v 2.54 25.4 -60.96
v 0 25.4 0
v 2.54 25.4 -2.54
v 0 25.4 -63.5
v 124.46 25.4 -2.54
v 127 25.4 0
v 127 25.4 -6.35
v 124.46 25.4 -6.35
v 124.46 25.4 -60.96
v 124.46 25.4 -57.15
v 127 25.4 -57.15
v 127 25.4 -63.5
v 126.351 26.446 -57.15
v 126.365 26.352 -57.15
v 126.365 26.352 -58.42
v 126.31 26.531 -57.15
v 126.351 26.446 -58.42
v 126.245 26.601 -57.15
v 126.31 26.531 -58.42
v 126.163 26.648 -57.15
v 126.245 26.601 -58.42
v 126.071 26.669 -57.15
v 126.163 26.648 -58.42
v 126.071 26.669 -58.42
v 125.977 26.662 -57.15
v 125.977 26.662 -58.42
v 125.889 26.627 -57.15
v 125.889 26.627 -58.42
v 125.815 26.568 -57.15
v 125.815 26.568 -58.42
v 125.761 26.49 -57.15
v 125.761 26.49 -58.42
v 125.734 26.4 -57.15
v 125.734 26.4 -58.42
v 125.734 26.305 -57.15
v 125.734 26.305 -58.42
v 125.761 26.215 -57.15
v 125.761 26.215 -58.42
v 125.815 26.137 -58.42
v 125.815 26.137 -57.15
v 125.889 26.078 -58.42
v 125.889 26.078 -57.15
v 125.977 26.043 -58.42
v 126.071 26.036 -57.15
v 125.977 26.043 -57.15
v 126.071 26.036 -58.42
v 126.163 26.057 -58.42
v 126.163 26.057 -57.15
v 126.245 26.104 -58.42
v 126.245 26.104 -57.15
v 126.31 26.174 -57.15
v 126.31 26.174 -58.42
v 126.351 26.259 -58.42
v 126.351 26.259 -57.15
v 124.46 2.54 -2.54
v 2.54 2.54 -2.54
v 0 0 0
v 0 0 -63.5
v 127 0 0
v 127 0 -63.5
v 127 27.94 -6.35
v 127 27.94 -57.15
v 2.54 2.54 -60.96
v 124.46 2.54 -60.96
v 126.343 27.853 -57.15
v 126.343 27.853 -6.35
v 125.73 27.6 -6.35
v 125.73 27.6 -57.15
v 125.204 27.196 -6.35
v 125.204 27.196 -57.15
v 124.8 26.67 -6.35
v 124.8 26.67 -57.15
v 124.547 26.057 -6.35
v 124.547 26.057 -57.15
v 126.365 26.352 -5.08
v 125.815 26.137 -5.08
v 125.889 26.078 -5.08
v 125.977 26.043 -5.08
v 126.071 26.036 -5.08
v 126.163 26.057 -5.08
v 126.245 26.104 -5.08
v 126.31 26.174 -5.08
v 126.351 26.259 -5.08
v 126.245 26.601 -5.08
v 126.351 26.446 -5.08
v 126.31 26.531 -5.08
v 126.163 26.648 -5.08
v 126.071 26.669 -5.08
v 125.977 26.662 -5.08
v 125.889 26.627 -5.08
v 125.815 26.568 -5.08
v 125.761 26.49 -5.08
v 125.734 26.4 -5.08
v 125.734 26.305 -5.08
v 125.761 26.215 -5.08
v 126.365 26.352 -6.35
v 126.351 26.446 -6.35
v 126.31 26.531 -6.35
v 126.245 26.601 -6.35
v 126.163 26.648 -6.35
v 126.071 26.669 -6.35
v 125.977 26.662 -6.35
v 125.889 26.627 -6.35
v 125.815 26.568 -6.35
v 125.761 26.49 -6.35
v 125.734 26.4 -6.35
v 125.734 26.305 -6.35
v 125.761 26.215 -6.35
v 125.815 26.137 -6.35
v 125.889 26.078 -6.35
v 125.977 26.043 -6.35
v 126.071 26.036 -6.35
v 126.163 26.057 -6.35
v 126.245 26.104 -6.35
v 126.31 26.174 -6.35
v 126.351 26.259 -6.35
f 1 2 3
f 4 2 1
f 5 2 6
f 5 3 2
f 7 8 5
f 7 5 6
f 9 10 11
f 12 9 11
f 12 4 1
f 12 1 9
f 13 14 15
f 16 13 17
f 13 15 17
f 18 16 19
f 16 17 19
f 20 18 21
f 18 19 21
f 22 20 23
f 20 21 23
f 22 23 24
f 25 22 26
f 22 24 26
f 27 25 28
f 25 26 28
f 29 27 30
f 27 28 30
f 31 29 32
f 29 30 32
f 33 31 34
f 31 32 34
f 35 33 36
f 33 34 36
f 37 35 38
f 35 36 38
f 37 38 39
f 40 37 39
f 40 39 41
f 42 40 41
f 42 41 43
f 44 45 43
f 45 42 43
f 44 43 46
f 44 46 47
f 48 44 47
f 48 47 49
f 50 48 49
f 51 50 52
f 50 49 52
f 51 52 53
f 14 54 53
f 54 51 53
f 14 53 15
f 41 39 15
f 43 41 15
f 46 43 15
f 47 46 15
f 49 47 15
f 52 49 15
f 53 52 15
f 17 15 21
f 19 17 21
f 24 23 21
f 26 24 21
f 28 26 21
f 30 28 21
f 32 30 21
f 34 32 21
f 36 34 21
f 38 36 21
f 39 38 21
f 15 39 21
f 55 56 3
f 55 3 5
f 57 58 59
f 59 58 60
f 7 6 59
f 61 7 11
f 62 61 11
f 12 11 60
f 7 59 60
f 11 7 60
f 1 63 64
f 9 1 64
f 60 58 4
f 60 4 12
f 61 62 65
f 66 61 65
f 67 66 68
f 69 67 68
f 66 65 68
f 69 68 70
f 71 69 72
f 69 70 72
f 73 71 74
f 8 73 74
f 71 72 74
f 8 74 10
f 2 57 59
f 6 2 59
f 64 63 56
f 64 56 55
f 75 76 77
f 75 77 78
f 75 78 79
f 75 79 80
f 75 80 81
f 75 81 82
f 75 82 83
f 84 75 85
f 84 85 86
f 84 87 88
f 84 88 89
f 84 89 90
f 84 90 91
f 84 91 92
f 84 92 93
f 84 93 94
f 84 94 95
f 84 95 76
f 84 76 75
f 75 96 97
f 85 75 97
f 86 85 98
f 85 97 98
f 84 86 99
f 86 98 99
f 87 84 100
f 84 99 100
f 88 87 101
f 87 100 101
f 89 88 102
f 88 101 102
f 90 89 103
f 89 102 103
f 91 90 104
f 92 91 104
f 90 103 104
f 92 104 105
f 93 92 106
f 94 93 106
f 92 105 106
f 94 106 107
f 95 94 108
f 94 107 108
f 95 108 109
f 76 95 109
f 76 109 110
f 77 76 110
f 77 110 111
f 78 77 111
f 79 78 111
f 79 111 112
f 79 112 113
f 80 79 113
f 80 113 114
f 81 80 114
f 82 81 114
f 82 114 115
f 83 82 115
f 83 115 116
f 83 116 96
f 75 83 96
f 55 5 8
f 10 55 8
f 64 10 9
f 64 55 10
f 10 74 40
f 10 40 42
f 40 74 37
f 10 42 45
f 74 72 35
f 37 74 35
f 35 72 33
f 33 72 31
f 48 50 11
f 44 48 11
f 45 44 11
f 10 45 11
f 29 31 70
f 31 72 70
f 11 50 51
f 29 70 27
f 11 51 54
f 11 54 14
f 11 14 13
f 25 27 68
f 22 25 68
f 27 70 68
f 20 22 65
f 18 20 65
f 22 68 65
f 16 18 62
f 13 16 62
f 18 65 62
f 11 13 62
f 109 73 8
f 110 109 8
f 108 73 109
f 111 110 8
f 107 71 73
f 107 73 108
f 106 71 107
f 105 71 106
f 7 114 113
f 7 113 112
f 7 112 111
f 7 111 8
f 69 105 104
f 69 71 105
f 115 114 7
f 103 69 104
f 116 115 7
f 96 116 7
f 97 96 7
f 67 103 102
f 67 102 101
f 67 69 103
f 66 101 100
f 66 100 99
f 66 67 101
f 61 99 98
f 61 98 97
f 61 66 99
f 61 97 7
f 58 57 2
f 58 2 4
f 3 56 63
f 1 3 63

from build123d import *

# Parameters (mm, degrees)
SKETCH1_W                = 127
SKETCH1_H                = 63.5
BOSS_EXTRUDE1_DEPTH      = 25.4
SHELL1_T                 = -2.54
BOSS_EXTRUDE2_DEPTH      = 25.4
BOSS_EXTRUDE2_DEPTH_BACK = 25.4
BOSS_EXTRUDE3_DEPTH      = 1.27
BOSS_EXTRUDE3_DEPTH_BACK = 52.07
SKETCH3_R                = 0.3175


with BuildPart() as part:
    # Sketch1 → Boss-Extrude1 (new body)
    with BuildSketch(Plane(origin=(0, 0, 0), x_dir=(1, 0, 0), z_dir=(0, 1, 0))):
        with Locations((63.5, 31.75)):
            Rectangle(SKETCH1_W, SKETCH1_H)
    extrude(amount=BOSS_EXTRUDE1_DEPTH)

    # Shell1
    shell1_openings = [part.faces().sort_by_distance(p)[0] for p in [
        (63.5, 25.4, -31.75),
    ]]
    offset(amount=SHELL1_T, openings=shell1_openings, kind=Kind.INTERSECTION)

    # Sketch2 → Boss-Extrude2 (add, two sides: drawn at the far end of the back side and taken through both)
    with BuildSketch(Plane.XY.offset(-31.75).offset(-BOSS_EXTRUDE2_DEPTH_BACK)):
        with BuildLine():
            Line((124.46, 25.4), (127, 25.4))
            Line((127, 25.4), (127, 27.94))
            ThreePointArc((127, 27.94), (125.203948776, 27.196051224), (124.46, 25.4))
        make_face()
    extrude(amount=BOSS_EXTRUDE2_DEPTH + BOSS_EXTRUDE2_DEPTH_BACK)

    # Sketch3 → Boss-Extrude3 (add, two sides: drawn at the far end of the back side and taken through both)
    with BuildSketch(Plane.XY.offset(-6.35).offset(-BOSS_EXTRUDE3_DEPTH_BACK)):
        with Locations((126.0475, 26.3525)):
            Circle(SKETCH3_R)
    extrude(amount=BOSS_EXTRUDE3_DEPTH + BOSS_EXTRUDE3_DEPTH_BACK)


solid = part.part
